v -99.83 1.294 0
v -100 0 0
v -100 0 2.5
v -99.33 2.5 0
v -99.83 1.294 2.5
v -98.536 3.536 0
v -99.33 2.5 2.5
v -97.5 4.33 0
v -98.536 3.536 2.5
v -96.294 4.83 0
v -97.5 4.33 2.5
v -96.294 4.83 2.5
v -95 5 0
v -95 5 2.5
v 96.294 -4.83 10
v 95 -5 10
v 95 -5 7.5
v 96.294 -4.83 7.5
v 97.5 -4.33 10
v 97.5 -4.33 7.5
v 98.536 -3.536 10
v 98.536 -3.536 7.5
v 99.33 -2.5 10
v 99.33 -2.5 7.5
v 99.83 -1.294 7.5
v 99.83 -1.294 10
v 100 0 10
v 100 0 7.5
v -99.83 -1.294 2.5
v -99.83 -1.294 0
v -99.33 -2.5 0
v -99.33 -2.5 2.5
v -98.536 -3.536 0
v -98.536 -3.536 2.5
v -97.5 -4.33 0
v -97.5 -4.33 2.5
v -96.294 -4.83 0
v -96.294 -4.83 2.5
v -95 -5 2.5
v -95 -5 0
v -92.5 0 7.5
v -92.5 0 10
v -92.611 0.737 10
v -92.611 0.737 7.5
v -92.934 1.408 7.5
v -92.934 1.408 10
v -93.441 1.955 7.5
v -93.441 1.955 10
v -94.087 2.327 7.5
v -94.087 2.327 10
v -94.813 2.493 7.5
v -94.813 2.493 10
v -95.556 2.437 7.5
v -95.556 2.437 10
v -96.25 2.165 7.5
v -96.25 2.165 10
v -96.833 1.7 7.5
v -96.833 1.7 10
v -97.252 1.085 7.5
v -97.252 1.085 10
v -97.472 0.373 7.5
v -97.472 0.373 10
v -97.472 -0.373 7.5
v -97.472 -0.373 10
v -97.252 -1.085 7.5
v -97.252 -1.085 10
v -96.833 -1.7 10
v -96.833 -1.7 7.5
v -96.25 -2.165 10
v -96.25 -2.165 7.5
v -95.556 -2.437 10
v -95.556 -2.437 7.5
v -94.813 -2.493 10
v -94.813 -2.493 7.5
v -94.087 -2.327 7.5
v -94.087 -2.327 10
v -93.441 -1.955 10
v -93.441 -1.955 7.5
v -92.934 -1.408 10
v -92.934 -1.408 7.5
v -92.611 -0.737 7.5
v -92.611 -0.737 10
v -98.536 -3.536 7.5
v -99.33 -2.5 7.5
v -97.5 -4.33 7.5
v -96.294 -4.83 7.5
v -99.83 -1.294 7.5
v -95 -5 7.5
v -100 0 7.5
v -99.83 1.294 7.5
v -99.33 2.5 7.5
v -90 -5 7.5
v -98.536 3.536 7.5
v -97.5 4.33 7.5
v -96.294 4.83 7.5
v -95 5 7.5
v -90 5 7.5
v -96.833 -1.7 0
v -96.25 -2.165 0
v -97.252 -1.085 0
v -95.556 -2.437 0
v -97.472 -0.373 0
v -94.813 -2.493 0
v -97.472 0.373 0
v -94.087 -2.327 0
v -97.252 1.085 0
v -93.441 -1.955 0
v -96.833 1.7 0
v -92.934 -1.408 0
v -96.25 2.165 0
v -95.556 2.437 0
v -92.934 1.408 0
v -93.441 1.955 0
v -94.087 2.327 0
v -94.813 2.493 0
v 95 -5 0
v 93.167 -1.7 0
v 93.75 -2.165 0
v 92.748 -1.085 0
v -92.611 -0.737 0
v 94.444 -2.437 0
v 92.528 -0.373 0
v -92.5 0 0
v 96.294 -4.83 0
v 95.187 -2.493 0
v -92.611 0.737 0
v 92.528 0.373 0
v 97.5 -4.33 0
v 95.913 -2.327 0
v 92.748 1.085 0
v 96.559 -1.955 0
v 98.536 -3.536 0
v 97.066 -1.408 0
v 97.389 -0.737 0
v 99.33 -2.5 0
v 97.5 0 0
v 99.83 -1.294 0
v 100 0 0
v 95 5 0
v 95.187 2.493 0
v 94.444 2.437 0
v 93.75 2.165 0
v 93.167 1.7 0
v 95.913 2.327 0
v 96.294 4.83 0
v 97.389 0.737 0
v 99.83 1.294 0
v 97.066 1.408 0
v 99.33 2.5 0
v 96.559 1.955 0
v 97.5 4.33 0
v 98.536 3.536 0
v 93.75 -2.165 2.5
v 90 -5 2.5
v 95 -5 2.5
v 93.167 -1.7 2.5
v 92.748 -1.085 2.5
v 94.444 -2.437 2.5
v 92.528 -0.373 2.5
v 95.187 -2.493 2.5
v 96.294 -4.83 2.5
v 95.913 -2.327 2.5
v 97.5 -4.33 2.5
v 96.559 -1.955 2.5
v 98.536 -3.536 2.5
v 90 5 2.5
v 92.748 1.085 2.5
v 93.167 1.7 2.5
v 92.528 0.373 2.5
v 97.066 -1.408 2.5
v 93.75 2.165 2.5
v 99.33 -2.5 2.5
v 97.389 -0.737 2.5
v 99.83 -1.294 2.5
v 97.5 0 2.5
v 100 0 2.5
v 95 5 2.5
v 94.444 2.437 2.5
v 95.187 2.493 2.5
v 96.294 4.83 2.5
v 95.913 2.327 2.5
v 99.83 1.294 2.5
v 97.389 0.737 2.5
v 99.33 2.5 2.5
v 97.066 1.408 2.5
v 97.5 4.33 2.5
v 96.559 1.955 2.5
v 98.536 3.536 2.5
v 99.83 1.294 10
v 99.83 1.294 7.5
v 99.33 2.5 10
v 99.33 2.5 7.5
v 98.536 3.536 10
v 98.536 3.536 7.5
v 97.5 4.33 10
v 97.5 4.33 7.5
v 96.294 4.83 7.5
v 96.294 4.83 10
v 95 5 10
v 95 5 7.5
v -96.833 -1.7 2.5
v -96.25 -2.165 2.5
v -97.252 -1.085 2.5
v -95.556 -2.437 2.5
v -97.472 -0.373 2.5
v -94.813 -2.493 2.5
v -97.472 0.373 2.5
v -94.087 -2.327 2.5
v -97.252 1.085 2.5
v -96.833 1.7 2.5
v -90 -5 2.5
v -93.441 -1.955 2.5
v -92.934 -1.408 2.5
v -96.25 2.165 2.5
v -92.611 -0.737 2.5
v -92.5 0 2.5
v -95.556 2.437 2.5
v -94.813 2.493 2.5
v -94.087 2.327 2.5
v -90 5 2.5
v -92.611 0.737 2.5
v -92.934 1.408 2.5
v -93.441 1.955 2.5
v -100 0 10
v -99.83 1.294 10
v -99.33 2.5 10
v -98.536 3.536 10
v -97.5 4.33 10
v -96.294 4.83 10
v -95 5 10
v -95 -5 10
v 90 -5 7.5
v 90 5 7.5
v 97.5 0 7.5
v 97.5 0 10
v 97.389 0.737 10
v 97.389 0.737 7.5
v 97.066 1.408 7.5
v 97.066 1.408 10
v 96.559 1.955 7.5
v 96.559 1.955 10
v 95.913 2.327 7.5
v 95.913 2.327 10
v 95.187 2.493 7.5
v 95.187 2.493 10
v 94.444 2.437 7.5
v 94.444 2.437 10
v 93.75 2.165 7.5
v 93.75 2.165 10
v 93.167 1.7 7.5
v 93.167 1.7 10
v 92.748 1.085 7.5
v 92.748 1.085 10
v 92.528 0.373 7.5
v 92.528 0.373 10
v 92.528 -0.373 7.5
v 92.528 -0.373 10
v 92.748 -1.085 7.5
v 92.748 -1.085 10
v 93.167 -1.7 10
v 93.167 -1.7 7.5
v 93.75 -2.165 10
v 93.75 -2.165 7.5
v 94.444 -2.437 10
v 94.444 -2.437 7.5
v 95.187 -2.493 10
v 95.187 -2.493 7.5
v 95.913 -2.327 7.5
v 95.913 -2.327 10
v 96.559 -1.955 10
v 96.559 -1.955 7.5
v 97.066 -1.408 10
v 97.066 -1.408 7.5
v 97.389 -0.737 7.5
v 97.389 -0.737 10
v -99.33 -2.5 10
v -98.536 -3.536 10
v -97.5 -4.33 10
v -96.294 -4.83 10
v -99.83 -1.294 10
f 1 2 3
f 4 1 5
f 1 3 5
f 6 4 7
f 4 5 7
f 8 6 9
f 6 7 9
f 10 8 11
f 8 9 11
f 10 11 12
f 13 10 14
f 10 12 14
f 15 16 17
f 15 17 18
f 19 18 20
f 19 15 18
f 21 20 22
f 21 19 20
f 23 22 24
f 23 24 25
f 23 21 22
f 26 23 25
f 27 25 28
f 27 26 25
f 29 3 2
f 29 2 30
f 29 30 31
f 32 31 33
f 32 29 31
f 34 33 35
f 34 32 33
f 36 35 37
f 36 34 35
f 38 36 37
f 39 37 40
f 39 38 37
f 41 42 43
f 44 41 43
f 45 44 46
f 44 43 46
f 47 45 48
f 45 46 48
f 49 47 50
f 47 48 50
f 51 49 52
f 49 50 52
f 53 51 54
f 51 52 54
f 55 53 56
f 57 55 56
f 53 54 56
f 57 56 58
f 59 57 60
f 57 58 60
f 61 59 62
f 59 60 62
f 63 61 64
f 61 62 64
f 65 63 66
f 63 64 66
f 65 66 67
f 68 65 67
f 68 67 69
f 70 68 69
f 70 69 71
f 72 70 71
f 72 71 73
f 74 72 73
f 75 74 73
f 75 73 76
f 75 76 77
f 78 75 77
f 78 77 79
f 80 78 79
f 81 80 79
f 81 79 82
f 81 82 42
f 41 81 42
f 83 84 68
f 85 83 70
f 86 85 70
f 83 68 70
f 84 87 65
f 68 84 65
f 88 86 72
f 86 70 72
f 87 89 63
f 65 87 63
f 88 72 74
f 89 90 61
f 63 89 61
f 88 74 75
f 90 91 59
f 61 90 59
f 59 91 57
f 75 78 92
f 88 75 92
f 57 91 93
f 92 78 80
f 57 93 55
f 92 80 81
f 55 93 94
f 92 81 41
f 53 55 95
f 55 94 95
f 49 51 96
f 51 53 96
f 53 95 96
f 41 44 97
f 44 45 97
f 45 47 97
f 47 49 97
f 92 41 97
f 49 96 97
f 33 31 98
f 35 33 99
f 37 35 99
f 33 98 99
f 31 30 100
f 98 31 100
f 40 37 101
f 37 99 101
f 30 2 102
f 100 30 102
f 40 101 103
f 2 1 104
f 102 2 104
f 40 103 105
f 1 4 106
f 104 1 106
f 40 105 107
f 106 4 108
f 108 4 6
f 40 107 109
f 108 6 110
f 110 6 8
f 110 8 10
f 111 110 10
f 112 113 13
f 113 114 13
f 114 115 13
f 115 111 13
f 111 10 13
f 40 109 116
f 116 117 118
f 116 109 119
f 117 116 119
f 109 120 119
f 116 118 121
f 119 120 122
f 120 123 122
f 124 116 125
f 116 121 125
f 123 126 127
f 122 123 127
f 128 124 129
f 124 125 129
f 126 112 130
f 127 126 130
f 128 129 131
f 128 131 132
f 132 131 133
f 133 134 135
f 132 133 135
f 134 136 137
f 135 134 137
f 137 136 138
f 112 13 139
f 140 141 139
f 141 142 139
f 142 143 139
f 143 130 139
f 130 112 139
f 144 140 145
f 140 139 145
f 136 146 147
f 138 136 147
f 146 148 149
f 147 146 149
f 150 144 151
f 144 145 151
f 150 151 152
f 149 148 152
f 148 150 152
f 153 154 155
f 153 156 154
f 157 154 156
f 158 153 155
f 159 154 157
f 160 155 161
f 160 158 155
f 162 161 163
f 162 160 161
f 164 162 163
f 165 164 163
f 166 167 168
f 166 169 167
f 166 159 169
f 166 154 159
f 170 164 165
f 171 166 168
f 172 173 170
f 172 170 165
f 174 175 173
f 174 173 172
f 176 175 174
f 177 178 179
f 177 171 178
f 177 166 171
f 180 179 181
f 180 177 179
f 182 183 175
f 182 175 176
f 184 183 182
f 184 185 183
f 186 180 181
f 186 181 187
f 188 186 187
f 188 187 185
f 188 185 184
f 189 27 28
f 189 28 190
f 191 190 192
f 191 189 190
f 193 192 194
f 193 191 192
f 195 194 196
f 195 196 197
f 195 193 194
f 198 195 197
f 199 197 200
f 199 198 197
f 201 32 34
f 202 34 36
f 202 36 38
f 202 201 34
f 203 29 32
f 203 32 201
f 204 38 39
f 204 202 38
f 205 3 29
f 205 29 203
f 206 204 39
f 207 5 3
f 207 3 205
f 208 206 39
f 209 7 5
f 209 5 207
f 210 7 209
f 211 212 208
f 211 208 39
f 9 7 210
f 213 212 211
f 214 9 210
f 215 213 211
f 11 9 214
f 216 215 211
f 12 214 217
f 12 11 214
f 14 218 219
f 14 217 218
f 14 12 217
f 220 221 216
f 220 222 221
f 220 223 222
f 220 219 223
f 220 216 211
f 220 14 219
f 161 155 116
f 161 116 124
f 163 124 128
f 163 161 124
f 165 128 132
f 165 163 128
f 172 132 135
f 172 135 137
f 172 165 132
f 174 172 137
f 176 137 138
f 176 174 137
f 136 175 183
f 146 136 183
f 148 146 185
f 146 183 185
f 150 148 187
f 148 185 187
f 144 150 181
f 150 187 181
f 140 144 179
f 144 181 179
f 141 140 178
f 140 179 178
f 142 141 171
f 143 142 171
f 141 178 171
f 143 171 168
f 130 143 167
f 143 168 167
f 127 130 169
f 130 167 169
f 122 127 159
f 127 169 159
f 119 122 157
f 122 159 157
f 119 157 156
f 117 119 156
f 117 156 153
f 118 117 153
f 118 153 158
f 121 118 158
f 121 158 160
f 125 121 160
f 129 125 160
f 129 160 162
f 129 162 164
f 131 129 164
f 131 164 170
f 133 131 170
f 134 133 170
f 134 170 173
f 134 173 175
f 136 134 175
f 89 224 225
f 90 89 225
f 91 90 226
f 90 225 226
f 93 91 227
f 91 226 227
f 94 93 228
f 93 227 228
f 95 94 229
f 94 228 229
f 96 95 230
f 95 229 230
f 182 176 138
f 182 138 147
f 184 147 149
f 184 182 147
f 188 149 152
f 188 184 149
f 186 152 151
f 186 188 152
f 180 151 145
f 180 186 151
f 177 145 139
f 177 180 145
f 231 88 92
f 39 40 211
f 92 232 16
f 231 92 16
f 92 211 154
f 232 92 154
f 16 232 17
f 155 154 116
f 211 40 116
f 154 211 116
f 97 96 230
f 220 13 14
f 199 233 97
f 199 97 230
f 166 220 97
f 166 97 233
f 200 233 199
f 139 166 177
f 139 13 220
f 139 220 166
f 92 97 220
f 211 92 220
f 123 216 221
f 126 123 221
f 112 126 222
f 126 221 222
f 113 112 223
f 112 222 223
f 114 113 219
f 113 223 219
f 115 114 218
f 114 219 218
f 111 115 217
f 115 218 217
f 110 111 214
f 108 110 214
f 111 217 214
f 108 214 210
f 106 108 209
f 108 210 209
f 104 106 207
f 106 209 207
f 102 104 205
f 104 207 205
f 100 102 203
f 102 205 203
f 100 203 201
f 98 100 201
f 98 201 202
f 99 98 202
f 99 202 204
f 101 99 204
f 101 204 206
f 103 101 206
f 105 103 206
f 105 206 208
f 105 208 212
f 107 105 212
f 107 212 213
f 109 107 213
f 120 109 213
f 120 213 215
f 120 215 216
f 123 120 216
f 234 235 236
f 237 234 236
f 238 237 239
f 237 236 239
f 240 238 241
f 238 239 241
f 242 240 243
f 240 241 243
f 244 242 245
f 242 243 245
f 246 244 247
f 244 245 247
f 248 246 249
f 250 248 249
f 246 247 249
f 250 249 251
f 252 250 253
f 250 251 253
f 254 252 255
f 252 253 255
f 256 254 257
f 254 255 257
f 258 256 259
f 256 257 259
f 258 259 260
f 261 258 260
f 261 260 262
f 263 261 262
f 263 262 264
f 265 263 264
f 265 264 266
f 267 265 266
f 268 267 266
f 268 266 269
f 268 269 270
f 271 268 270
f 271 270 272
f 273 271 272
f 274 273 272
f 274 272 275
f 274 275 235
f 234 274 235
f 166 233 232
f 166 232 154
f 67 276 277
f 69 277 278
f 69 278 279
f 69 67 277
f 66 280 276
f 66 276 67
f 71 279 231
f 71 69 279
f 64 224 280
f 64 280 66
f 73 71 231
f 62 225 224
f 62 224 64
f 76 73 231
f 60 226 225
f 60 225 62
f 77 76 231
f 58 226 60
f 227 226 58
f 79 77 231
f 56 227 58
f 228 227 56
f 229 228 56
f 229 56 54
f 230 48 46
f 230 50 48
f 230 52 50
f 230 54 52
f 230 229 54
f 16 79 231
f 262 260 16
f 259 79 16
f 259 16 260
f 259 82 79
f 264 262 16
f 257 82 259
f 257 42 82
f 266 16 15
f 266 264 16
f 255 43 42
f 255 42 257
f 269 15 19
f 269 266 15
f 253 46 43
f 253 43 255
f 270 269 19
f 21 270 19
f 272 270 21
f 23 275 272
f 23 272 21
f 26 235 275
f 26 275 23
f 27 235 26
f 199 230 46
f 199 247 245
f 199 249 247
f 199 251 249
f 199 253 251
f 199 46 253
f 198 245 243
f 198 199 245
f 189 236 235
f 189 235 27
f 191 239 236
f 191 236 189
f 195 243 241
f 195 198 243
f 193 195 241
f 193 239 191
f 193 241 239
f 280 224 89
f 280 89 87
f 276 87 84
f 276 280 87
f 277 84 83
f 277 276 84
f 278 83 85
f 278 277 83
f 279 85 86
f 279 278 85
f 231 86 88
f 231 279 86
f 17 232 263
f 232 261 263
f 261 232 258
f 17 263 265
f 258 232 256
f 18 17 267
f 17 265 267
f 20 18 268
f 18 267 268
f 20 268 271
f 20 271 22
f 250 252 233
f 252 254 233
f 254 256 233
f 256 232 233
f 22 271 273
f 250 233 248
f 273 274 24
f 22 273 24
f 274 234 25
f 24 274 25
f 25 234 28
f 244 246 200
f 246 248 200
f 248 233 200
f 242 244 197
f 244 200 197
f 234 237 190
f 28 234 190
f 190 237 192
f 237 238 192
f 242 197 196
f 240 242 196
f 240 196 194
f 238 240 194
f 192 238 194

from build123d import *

# Parameters (mm, degrees)
SKETCH1_W           = 200
SKETCH1_H           = 10
BOSS_EXTRUDE1_DEPTH = 10
FILLET1_R           = 5
SKETCH2_R           = 2.5
CUT_EXTRUDE1_DEPTH  = 10
SKETCH3_W           = 10
SKETCH3_H           = 5
CUT_EXTRUDE2_DEPTH  = 10


with BuildPart() as part:
    # Sketch1 → Boss-Extrude1 (new body)
    with BuildSketch(Plane.XY):
        Rectangle(SKETCH1_W, SKETCH1_H)
    extrude(amount=BOSS_EXTRUDE1_DEPTH)

    # Fillet1
    fillet1_edges = [part.edges().sort_by_distance(p)[0] for p in [
        (-100, -5, 5),
        (-100, 5, 5),
        (100, -5, 5),
        (100, 5, 5),
    ]]
    fillet(fillet1_edges, radius=FILLET1_R - 0.0001)  # a hair under: the kernel refuses the full size

    # Sketch2 → Cut-Extrude1 (cut)
    with BuildSketch(Plane.XY.offset(10)):
        with Locations((95, 0)):
            Circle(SKETCH2_R)
        with Locations((-95, 0)):
            Circle(SKETCH2_R)
    extrude(amount=-CUT_EXTRUDE1_DEPTH, mode=Mode.SUBTRACT)

    # Sketch3 → Cut-Extrude2 (cut)
    with BuildSketch(Plane(origin=(0, 5, 0), x_dir=(1, 0, 0), z_dir=(0, 1, 0))):
        with Locations((-95, -5)):
            Rectangle(SKETCH3_W, SKETCH3_H)
        with Locations((95, -5)):
            Rectangle(SKETCH3_W, SKETCH3_H)
    extrude(amount=-CUT_EXTRUDE2_DEPTH, mode=Mode.SUBTRACT)


solid = part.part
